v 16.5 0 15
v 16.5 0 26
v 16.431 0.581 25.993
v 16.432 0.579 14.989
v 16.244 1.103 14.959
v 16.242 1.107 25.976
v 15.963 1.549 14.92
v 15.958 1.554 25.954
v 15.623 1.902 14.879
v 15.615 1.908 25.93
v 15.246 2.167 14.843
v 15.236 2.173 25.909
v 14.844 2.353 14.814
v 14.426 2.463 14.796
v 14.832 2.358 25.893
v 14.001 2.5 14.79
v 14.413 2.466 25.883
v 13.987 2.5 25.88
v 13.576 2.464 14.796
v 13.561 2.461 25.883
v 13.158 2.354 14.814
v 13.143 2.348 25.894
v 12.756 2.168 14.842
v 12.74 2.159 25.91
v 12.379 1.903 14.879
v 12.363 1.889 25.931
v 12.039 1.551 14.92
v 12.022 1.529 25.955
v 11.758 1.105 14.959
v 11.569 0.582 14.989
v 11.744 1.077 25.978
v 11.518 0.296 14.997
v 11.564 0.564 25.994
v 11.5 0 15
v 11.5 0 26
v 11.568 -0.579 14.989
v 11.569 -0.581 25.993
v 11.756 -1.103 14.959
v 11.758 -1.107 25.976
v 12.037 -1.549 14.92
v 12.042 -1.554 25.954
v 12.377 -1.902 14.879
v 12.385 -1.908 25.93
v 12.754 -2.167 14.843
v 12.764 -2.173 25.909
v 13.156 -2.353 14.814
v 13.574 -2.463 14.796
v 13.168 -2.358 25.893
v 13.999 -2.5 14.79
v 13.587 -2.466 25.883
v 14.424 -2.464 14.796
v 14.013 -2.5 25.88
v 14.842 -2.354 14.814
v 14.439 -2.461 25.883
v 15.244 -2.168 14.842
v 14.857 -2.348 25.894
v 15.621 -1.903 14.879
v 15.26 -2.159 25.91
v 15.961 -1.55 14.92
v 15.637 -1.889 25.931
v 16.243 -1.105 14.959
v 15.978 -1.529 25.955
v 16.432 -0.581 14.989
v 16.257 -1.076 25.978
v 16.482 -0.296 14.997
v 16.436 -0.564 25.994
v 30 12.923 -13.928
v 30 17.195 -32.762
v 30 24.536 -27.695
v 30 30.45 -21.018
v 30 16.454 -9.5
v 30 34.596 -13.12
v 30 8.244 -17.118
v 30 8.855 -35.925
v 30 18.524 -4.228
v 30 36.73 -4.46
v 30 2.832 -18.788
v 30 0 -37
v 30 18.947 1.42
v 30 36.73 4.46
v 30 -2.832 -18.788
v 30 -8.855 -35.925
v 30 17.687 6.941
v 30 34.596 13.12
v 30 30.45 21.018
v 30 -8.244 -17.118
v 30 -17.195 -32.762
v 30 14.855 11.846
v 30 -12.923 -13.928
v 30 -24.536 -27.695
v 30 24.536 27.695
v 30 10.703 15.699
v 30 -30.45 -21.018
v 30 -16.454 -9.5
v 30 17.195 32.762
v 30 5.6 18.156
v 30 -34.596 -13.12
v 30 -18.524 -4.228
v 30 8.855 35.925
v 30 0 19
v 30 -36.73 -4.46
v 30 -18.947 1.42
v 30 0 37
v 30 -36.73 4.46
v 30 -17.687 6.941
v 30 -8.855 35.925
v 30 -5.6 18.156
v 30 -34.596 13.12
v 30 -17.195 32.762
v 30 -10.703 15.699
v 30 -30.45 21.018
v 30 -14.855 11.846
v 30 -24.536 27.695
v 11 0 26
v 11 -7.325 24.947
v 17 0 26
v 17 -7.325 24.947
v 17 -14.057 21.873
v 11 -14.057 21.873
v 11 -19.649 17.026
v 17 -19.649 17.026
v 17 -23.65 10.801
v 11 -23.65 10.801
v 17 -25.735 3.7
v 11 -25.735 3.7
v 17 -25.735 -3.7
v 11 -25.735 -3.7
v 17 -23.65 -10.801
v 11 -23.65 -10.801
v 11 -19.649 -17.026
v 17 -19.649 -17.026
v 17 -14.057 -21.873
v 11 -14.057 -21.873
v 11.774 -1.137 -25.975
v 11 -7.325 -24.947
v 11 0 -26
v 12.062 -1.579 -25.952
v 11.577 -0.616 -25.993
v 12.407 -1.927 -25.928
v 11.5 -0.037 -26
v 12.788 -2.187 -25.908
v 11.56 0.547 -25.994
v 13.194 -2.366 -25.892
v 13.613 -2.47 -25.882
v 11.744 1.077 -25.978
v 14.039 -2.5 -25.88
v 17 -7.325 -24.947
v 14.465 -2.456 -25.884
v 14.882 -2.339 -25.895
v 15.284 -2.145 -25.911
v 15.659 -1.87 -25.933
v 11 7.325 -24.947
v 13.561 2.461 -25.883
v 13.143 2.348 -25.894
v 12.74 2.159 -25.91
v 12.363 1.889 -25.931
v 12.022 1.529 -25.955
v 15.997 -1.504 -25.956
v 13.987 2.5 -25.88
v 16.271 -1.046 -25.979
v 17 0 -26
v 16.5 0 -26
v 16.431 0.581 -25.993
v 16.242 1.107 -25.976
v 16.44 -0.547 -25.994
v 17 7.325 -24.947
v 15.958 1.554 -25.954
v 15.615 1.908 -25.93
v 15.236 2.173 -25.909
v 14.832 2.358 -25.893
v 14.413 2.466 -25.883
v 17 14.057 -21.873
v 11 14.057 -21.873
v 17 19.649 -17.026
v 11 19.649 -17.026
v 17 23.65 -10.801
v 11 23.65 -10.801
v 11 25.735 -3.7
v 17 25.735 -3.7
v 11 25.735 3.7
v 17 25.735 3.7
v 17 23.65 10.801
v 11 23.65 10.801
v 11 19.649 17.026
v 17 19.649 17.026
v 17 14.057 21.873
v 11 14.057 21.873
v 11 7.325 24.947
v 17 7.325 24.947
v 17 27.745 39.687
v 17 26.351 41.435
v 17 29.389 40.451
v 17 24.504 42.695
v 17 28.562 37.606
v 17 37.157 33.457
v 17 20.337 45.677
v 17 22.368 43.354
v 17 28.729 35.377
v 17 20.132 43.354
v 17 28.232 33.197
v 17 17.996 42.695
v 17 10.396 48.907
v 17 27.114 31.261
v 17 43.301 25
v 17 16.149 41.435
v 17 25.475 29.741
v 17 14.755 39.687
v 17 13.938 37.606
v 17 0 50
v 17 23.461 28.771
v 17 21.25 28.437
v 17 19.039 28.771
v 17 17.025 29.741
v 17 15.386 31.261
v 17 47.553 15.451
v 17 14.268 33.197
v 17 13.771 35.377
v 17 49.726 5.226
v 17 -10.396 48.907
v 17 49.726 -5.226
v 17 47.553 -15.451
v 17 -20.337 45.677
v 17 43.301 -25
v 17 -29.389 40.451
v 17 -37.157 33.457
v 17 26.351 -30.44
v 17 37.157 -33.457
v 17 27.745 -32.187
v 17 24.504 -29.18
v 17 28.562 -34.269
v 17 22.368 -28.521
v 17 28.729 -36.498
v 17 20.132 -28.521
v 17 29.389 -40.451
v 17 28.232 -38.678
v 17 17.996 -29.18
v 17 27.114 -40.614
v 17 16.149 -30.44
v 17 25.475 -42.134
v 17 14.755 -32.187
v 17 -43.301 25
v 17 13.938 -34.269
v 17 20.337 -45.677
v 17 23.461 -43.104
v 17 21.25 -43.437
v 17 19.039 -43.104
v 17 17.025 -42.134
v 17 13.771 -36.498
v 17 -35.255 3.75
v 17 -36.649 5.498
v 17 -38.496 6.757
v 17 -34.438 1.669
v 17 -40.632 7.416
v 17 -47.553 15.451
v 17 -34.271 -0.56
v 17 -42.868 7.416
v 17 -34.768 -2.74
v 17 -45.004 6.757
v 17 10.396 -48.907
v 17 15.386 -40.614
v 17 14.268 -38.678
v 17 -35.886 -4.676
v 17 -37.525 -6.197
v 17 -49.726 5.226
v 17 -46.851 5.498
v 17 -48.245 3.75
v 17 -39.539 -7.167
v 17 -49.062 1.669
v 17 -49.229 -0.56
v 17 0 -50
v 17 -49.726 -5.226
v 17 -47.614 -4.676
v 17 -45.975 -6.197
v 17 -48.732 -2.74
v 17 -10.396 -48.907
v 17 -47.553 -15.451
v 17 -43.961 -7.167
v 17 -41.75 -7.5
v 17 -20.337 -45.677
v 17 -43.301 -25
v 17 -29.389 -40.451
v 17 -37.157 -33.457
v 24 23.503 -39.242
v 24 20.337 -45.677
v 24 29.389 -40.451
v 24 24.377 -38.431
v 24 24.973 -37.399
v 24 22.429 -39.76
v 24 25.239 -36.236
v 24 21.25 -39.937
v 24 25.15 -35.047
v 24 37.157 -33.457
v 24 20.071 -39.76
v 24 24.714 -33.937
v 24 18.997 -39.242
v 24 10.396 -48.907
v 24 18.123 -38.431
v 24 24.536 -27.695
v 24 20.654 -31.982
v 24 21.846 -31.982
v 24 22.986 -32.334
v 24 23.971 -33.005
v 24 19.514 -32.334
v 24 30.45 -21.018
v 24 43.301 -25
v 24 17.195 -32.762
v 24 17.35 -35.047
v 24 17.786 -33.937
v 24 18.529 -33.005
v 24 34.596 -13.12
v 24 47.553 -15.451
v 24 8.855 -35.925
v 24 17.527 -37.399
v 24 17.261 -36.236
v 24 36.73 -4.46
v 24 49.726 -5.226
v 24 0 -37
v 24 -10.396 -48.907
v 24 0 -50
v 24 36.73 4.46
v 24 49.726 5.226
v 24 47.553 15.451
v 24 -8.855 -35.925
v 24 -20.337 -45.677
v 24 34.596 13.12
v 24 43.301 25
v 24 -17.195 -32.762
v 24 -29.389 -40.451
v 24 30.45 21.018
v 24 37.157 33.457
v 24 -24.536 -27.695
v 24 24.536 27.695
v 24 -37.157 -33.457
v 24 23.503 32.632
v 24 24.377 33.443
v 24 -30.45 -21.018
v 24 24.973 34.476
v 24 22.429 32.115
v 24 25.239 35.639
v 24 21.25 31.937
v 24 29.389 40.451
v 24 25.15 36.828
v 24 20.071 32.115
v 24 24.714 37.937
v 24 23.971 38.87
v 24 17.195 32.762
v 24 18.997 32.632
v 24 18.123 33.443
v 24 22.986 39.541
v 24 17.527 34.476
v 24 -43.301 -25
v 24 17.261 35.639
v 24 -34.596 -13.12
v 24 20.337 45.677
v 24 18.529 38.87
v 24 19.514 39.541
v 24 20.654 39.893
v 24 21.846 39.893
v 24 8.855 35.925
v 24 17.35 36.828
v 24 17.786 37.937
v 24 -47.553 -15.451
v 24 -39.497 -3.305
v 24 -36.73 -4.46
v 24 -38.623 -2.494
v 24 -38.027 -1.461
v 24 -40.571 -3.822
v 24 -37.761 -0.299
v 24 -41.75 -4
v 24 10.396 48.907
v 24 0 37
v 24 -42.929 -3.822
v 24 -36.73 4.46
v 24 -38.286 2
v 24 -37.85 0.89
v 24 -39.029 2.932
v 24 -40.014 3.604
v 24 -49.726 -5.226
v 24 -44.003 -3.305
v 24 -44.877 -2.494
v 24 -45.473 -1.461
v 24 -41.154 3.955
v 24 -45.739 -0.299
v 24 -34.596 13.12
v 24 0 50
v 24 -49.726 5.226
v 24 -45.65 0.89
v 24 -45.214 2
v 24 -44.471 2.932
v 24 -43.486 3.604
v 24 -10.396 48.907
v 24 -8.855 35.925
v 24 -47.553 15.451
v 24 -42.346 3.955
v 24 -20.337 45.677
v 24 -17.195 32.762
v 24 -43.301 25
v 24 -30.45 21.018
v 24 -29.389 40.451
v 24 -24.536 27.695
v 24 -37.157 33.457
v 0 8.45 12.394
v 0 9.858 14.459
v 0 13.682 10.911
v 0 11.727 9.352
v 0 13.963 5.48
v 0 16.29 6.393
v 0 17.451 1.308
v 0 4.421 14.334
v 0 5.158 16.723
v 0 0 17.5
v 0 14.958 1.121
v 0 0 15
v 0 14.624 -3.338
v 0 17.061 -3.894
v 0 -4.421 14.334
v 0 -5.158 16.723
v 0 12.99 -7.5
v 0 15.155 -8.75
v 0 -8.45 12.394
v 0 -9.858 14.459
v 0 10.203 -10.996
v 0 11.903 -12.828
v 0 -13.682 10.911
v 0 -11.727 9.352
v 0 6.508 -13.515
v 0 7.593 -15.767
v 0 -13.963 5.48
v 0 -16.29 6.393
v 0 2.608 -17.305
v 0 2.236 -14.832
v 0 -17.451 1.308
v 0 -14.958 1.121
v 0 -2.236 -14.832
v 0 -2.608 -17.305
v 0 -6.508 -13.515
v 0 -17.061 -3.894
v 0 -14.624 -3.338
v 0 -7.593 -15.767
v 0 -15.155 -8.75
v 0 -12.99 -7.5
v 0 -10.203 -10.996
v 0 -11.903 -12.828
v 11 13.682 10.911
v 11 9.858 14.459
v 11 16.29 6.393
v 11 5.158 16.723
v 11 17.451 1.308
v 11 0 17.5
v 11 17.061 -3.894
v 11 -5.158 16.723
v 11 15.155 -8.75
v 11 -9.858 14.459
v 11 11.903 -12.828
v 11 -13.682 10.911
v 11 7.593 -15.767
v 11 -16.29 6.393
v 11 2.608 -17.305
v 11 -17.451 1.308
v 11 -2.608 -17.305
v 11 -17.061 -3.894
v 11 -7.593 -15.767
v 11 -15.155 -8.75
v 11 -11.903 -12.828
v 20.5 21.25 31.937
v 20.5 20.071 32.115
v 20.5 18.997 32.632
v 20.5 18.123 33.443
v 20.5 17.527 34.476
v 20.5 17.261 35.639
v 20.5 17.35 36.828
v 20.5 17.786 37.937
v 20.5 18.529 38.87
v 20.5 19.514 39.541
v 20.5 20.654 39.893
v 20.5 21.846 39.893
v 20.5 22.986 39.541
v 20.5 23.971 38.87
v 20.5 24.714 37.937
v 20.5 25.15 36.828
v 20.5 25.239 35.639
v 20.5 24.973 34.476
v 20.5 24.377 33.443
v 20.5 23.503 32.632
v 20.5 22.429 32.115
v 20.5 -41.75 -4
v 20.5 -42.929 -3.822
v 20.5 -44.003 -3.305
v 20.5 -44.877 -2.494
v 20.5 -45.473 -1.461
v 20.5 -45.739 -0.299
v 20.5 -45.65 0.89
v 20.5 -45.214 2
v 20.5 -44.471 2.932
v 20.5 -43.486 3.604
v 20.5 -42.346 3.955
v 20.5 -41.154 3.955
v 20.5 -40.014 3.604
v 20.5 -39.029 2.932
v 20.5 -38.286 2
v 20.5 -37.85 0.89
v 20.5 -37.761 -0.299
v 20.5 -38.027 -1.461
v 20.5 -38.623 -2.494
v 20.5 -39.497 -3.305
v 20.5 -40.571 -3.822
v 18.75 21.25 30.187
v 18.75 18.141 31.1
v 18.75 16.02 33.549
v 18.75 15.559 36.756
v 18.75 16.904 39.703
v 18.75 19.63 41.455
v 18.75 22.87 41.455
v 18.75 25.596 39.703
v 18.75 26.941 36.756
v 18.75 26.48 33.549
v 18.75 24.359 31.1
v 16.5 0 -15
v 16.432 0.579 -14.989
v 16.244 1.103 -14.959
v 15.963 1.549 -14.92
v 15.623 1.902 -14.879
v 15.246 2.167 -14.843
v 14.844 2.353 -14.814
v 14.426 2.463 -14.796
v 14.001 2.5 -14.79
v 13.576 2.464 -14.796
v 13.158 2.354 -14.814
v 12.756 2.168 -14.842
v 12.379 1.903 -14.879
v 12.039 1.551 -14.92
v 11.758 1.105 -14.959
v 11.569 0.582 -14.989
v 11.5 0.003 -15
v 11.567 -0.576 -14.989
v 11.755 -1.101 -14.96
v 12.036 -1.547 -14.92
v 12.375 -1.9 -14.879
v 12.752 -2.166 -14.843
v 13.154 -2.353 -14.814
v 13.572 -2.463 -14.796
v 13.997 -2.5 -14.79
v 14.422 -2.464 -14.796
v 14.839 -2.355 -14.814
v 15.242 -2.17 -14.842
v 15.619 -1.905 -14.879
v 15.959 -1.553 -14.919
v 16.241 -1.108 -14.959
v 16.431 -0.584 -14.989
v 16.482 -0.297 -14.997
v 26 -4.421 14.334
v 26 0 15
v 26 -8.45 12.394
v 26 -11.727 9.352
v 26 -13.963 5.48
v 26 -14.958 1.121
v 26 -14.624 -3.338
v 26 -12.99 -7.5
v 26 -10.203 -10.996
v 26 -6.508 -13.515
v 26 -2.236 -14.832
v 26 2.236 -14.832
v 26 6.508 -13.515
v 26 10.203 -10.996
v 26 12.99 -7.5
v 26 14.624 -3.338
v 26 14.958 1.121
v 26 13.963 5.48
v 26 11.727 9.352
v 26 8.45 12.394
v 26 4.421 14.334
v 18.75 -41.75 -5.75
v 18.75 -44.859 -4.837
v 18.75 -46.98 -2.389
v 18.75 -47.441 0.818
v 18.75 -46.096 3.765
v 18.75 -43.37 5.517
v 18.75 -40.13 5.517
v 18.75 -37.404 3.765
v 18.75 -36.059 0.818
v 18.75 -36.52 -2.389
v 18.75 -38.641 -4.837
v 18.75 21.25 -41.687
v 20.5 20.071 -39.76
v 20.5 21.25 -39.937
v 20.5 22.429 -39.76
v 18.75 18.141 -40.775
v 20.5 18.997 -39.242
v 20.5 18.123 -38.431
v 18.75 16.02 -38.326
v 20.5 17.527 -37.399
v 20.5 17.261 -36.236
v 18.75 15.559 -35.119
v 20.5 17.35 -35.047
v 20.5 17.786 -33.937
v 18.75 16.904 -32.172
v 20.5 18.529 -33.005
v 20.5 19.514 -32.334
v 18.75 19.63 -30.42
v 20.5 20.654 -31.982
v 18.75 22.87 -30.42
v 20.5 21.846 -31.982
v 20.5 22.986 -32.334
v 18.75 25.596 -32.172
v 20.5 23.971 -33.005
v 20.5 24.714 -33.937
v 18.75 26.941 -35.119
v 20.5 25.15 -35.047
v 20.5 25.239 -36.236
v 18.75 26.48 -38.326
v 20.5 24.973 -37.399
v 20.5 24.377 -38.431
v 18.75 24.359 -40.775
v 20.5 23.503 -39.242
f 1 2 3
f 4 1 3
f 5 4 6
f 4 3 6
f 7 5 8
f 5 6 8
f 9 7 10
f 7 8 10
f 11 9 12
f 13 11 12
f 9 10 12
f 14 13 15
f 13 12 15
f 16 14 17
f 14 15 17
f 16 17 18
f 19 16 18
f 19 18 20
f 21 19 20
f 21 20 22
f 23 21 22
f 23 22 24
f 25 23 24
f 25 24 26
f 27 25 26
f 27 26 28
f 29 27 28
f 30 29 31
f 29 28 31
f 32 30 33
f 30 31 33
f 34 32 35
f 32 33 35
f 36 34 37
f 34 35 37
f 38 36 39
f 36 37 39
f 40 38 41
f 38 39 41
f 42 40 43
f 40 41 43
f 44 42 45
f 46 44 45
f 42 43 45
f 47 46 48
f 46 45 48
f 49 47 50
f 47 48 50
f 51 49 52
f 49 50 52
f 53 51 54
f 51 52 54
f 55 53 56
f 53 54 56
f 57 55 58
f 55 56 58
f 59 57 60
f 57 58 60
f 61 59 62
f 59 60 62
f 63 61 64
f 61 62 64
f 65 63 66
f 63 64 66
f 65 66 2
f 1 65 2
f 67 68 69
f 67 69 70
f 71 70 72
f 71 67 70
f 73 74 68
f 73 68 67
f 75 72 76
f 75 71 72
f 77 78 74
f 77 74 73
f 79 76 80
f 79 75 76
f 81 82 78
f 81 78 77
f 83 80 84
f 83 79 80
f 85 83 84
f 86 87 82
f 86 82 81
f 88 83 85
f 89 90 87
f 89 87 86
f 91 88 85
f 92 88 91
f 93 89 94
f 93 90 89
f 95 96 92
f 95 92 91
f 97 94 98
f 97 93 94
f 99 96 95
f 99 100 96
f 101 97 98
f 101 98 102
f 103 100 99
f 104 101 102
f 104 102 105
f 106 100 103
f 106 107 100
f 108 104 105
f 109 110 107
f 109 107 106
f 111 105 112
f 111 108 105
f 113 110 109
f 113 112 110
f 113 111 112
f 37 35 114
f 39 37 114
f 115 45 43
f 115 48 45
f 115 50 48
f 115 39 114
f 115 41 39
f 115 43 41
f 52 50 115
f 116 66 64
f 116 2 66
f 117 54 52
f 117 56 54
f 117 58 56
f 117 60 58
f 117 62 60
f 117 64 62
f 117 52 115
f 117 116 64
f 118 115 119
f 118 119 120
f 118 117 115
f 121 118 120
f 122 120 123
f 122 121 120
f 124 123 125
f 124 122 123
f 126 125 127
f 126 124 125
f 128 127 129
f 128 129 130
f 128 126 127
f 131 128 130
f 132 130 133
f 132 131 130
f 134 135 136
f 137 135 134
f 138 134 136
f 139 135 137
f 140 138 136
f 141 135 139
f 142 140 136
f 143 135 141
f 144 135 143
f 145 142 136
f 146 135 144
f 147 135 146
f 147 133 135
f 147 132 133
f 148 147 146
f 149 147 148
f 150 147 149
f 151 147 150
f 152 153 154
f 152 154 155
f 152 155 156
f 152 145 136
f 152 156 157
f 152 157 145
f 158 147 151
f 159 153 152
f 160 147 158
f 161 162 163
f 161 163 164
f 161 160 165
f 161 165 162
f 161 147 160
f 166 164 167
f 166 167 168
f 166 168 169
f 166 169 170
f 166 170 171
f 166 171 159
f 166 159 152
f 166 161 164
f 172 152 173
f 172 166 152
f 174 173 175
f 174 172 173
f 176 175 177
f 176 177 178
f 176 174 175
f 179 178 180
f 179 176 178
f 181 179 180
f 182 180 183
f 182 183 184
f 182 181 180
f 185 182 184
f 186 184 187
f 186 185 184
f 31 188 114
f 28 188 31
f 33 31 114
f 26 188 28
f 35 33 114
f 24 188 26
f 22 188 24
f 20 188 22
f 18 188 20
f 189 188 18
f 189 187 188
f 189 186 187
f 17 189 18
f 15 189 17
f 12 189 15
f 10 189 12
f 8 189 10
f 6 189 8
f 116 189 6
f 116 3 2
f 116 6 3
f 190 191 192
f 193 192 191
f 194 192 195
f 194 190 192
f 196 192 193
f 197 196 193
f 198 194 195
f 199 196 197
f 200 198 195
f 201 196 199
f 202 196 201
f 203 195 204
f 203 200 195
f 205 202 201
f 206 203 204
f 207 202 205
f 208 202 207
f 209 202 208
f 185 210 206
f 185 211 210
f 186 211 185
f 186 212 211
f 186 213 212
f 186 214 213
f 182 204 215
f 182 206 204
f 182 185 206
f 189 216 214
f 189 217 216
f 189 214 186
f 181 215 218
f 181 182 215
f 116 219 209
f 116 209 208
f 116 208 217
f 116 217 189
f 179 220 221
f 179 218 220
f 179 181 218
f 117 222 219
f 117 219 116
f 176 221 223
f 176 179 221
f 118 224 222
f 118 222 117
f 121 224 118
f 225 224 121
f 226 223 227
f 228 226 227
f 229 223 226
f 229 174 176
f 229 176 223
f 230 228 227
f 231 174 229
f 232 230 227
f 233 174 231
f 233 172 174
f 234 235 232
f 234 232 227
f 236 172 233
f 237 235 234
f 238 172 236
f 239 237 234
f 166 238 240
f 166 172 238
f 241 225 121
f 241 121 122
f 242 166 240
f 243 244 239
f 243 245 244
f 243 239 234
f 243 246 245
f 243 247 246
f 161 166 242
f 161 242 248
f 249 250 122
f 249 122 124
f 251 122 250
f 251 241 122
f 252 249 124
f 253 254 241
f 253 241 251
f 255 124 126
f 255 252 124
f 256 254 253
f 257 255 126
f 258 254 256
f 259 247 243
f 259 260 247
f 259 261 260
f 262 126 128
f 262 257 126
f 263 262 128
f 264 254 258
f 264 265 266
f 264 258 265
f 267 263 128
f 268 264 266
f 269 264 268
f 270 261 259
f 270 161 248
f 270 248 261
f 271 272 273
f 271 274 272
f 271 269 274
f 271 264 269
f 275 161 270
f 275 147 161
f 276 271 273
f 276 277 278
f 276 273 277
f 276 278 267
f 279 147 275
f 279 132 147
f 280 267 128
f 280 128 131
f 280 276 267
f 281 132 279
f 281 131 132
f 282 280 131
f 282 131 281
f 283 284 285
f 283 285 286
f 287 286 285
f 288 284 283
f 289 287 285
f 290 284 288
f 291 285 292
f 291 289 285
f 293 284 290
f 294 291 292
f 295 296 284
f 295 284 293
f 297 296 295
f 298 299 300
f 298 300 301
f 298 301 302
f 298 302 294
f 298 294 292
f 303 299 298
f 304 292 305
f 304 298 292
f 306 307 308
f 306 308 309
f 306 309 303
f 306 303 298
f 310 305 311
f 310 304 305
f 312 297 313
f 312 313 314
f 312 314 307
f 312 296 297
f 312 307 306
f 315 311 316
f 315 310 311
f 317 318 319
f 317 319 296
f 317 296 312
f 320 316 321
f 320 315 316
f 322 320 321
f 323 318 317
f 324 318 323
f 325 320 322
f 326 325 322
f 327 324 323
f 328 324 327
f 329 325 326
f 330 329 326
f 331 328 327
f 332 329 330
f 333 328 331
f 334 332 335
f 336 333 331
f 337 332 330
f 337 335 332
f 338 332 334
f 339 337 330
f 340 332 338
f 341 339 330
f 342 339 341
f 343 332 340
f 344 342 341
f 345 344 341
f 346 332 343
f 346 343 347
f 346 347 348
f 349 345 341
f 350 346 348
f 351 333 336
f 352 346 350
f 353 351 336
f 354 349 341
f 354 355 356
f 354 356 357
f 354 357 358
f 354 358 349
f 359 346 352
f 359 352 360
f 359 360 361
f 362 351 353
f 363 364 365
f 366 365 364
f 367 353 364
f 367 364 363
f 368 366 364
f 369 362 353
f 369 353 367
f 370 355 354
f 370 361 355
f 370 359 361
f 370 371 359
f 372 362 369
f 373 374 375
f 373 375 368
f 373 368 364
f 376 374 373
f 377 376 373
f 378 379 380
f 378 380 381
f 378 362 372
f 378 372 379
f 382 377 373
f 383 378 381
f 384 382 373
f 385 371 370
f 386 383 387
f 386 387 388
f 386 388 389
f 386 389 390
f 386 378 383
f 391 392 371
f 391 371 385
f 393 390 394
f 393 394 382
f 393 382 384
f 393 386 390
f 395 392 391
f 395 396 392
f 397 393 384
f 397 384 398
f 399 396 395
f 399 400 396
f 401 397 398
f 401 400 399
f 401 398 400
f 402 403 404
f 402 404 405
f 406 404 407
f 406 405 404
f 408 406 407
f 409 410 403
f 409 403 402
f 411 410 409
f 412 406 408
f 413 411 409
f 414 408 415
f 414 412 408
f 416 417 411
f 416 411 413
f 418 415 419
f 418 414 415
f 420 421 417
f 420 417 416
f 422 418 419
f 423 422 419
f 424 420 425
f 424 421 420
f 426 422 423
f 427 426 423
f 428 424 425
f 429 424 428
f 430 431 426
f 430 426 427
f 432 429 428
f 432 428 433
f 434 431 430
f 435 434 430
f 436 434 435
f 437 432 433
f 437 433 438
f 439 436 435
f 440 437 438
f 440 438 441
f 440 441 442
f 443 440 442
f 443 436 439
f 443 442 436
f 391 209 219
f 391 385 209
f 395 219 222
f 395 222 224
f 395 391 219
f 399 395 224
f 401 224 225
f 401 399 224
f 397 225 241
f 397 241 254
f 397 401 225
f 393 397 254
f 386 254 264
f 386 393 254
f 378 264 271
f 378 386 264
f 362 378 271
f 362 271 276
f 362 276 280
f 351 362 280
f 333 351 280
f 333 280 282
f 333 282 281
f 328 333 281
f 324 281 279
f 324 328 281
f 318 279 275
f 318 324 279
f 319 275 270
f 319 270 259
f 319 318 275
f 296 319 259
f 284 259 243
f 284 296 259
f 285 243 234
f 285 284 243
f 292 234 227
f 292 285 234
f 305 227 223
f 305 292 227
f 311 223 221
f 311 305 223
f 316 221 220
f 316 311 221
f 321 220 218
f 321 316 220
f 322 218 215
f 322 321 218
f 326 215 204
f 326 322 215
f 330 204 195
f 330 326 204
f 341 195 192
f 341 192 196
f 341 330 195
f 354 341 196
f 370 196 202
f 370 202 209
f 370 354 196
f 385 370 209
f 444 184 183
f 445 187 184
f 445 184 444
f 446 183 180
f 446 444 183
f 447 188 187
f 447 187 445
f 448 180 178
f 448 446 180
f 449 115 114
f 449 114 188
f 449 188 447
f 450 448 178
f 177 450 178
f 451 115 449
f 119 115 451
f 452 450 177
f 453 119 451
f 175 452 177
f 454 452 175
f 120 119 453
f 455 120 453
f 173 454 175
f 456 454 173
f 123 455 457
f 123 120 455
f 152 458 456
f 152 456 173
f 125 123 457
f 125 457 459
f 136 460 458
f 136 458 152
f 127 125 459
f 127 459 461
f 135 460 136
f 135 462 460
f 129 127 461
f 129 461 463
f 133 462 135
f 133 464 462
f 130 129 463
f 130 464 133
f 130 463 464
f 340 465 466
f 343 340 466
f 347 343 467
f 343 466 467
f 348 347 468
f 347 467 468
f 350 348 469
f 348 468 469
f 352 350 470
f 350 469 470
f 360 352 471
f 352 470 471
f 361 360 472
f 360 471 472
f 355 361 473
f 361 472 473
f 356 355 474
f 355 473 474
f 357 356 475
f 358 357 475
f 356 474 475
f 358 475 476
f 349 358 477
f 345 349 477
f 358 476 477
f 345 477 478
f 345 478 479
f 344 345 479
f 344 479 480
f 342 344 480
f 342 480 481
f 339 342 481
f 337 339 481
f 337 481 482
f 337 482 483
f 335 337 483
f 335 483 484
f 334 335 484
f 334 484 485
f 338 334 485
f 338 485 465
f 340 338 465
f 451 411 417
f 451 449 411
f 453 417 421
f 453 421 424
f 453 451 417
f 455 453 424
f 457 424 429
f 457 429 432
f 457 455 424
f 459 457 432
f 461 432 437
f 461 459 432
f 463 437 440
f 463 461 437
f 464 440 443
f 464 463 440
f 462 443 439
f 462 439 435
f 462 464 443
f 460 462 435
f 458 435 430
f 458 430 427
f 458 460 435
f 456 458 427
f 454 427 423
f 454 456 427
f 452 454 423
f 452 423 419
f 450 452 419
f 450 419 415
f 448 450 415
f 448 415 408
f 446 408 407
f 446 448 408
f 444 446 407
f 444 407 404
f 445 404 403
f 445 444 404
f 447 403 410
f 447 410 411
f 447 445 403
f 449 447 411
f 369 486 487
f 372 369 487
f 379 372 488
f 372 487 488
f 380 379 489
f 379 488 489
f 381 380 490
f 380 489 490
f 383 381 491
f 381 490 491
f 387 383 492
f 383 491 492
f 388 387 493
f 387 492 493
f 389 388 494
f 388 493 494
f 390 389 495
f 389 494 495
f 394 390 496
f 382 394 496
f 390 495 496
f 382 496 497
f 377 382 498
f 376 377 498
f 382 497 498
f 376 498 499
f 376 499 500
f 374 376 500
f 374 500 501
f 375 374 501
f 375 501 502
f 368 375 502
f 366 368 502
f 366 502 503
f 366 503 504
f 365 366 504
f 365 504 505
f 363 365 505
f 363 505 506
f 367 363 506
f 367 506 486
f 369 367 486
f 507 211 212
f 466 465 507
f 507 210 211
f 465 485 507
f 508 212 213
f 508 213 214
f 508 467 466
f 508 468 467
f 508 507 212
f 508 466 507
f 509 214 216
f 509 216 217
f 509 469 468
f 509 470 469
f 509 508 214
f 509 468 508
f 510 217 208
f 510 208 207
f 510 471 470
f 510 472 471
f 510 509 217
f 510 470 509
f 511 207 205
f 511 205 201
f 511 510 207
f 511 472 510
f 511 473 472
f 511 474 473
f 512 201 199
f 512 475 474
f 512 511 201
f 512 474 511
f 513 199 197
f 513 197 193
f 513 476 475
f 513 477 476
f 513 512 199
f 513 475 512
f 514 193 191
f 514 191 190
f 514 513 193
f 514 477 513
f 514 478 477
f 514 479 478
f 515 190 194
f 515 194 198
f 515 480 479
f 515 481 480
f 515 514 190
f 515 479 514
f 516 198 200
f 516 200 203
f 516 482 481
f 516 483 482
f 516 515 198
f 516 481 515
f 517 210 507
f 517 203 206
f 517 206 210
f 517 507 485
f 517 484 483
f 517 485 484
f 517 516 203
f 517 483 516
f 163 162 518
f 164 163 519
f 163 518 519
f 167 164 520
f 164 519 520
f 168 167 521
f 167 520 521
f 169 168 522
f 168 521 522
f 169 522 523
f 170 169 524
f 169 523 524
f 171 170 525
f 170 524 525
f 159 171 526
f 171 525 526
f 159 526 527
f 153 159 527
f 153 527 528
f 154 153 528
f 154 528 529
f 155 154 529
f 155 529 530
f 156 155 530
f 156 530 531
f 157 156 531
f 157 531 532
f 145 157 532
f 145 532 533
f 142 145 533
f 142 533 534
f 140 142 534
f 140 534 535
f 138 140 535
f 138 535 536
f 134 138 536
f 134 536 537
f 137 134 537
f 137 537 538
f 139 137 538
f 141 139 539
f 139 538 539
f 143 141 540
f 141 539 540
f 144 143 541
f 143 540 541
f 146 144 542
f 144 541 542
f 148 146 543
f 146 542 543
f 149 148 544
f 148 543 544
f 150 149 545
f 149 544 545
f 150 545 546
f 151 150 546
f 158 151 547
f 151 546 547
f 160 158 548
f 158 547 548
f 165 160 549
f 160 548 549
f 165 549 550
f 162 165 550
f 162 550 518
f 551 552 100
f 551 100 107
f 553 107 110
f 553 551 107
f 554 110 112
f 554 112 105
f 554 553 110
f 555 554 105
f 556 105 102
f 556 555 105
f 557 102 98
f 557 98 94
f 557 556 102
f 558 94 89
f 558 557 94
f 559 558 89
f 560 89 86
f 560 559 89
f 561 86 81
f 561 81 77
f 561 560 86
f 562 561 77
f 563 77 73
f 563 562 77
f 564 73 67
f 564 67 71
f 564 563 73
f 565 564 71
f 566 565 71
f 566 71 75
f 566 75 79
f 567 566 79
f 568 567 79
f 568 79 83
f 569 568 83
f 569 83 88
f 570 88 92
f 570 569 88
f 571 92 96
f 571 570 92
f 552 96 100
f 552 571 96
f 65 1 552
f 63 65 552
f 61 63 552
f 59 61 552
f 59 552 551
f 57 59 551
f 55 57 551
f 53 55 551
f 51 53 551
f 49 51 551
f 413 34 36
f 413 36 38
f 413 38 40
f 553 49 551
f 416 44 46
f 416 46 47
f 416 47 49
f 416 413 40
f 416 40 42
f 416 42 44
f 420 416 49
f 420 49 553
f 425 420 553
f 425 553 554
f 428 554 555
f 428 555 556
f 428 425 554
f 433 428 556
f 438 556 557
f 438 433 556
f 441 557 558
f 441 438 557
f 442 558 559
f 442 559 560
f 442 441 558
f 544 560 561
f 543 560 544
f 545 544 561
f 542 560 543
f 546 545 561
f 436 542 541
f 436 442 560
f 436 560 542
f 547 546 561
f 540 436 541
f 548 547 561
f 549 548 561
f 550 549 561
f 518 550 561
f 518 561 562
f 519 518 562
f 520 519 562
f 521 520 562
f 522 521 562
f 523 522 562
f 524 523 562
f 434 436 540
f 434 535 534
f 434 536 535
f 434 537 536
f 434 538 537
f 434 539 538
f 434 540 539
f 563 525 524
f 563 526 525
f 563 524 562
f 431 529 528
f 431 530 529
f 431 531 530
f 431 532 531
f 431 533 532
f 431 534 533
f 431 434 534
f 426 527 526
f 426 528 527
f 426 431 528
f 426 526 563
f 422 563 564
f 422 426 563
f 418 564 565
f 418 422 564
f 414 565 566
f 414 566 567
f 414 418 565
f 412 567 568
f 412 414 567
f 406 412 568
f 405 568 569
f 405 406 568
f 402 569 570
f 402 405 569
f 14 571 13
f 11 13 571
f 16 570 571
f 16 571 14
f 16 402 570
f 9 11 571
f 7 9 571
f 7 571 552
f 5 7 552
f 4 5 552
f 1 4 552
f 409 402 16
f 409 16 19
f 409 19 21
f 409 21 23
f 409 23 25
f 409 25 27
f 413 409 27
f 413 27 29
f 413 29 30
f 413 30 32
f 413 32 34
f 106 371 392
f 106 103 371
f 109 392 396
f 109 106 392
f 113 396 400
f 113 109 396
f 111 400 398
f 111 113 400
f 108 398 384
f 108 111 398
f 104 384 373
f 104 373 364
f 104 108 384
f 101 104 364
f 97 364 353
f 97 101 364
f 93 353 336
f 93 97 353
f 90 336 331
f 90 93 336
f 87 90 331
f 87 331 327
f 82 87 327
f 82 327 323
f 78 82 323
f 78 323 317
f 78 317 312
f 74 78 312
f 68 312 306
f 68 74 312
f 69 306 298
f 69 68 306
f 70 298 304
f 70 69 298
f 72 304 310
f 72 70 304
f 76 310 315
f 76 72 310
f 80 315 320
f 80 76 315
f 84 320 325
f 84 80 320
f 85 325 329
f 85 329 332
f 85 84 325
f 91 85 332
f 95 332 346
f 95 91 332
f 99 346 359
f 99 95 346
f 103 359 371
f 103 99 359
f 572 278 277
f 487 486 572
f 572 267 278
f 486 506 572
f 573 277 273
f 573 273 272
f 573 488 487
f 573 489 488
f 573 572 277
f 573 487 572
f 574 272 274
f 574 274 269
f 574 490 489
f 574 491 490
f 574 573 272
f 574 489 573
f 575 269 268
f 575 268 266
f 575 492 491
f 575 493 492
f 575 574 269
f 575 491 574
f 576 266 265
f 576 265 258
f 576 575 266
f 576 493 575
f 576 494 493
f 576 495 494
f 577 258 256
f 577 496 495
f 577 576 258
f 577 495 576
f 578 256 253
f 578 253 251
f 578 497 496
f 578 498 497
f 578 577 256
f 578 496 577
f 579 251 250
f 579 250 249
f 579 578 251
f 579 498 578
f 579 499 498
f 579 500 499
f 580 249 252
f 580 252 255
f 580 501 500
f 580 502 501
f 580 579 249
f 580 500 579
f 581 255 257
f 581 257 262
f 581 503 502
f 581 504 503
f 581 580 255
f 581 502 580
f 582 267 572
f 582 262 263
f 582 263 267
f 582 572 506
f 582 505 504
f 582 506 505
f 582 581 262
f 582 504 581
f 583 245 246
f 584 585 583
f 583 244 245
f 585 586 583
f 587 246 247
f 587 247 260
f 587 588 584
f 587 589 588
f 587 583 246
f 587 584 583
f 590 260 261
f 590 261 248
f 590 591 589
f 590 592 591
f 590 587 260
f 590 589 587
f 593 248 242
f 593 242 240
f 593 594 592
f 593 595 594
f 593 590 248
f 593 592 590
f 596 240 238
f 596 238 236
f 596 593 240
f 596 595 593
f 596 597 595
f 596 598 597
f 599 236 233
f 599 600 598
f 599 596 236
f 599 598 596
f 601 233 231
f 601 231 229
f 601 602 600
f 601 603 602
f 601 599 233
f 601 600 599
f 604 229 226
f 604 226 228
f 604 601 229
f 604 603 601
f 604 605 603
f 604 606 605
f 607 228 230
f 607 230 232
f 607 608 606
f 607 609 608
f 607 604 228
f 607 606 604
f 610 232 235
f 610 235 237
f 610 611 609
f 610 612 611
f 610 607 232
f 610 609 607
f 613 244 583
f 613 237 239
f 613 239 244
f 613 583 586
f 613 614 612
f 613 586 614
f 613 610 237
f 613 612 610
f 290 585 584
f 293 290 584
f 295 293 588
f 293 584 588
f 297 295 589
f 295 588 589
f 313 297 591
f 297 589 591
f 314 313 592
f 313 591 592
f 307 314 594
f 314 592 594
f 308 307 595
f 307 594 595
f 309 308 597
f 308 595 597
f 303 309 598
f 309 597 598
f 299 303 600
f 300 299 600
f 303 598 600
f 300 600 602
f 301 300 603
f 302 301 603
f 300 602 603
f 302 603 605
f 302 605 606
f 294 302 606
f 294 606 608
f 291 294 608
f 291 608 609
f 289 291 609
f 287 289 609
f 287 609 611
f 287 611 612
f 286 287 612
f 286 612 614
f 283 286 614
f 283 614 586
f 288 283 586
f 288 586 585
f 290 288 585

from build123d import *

# Parameters (mm, degrees)
SKETCH001_R     = 4
POCKET_DEPTH    = 23.001
CHAMFER_SIZE    = 3.5
CHAMFER001_SIZE = 4
SKETCH002_R     = 2.5
POCKET001_DEPTH = 100.001


with BuildPart() as part:
    # Sketch → Revolution (revolve)
    with BuildSketch(Plane.XZ):
        Polygon((0, 15), (0, 17.5), (11, 17.5), (11, 26), (17, 26), (17, 50), (24, 50), (24, 37), (30, 37), (30, 15), align=None)
    revolve(axis=Axis((0, 0, 0), (1, 0, 0)))

    # Sketch001 → Pocket (cut, through all)
    with BuildSketch(Plane(origin=(7, 0, 0), x_dir=(0, 0, -1), z_dir=(-1, 0, 0))):
        with Locations((0, 41.75)):
            Circle(SKETCH001_R)
        with Locations((35.937446, -21.25)):
            Circle(SKETCH001_R)
        with Locations((-35.937446, -21.25)):
            Circle(SKETCH001_R)
    extrude(amount=-POCKET_DEPTH, mode=Mode.SUBTRACT)

    # Chamfer
    chamfer_edges = [part.edges().sort_by_distance(p)[0] for p in [
        (17, -41.75, 4),
        (17, 21.25, 39.937446),
        (17, 21.25, -31.937446),
    ]]
    chamfer(chamfer_edges, length=CHAMFER_SIZE)

    # Chamfer001
    chamfer001_edges = [part.edges().sort_by_distance(p)[0] for p in [
        (30, 0, -15),
    ]]
    chamfer(chamfer001_edges, length=CHAMFER001_SIZE)

    # Sketch002 (on DatumPlane) → Pocket001 (cut, through all)
    with BuildSketch(Plane.XY.offset(50)):
        with Locations((14, 0)):
            Circle(SKETCH002_R)
    extrude(amount=-POCKET001_DEPTH, mode=Mode.SUBTRACT)


solid = part.part
